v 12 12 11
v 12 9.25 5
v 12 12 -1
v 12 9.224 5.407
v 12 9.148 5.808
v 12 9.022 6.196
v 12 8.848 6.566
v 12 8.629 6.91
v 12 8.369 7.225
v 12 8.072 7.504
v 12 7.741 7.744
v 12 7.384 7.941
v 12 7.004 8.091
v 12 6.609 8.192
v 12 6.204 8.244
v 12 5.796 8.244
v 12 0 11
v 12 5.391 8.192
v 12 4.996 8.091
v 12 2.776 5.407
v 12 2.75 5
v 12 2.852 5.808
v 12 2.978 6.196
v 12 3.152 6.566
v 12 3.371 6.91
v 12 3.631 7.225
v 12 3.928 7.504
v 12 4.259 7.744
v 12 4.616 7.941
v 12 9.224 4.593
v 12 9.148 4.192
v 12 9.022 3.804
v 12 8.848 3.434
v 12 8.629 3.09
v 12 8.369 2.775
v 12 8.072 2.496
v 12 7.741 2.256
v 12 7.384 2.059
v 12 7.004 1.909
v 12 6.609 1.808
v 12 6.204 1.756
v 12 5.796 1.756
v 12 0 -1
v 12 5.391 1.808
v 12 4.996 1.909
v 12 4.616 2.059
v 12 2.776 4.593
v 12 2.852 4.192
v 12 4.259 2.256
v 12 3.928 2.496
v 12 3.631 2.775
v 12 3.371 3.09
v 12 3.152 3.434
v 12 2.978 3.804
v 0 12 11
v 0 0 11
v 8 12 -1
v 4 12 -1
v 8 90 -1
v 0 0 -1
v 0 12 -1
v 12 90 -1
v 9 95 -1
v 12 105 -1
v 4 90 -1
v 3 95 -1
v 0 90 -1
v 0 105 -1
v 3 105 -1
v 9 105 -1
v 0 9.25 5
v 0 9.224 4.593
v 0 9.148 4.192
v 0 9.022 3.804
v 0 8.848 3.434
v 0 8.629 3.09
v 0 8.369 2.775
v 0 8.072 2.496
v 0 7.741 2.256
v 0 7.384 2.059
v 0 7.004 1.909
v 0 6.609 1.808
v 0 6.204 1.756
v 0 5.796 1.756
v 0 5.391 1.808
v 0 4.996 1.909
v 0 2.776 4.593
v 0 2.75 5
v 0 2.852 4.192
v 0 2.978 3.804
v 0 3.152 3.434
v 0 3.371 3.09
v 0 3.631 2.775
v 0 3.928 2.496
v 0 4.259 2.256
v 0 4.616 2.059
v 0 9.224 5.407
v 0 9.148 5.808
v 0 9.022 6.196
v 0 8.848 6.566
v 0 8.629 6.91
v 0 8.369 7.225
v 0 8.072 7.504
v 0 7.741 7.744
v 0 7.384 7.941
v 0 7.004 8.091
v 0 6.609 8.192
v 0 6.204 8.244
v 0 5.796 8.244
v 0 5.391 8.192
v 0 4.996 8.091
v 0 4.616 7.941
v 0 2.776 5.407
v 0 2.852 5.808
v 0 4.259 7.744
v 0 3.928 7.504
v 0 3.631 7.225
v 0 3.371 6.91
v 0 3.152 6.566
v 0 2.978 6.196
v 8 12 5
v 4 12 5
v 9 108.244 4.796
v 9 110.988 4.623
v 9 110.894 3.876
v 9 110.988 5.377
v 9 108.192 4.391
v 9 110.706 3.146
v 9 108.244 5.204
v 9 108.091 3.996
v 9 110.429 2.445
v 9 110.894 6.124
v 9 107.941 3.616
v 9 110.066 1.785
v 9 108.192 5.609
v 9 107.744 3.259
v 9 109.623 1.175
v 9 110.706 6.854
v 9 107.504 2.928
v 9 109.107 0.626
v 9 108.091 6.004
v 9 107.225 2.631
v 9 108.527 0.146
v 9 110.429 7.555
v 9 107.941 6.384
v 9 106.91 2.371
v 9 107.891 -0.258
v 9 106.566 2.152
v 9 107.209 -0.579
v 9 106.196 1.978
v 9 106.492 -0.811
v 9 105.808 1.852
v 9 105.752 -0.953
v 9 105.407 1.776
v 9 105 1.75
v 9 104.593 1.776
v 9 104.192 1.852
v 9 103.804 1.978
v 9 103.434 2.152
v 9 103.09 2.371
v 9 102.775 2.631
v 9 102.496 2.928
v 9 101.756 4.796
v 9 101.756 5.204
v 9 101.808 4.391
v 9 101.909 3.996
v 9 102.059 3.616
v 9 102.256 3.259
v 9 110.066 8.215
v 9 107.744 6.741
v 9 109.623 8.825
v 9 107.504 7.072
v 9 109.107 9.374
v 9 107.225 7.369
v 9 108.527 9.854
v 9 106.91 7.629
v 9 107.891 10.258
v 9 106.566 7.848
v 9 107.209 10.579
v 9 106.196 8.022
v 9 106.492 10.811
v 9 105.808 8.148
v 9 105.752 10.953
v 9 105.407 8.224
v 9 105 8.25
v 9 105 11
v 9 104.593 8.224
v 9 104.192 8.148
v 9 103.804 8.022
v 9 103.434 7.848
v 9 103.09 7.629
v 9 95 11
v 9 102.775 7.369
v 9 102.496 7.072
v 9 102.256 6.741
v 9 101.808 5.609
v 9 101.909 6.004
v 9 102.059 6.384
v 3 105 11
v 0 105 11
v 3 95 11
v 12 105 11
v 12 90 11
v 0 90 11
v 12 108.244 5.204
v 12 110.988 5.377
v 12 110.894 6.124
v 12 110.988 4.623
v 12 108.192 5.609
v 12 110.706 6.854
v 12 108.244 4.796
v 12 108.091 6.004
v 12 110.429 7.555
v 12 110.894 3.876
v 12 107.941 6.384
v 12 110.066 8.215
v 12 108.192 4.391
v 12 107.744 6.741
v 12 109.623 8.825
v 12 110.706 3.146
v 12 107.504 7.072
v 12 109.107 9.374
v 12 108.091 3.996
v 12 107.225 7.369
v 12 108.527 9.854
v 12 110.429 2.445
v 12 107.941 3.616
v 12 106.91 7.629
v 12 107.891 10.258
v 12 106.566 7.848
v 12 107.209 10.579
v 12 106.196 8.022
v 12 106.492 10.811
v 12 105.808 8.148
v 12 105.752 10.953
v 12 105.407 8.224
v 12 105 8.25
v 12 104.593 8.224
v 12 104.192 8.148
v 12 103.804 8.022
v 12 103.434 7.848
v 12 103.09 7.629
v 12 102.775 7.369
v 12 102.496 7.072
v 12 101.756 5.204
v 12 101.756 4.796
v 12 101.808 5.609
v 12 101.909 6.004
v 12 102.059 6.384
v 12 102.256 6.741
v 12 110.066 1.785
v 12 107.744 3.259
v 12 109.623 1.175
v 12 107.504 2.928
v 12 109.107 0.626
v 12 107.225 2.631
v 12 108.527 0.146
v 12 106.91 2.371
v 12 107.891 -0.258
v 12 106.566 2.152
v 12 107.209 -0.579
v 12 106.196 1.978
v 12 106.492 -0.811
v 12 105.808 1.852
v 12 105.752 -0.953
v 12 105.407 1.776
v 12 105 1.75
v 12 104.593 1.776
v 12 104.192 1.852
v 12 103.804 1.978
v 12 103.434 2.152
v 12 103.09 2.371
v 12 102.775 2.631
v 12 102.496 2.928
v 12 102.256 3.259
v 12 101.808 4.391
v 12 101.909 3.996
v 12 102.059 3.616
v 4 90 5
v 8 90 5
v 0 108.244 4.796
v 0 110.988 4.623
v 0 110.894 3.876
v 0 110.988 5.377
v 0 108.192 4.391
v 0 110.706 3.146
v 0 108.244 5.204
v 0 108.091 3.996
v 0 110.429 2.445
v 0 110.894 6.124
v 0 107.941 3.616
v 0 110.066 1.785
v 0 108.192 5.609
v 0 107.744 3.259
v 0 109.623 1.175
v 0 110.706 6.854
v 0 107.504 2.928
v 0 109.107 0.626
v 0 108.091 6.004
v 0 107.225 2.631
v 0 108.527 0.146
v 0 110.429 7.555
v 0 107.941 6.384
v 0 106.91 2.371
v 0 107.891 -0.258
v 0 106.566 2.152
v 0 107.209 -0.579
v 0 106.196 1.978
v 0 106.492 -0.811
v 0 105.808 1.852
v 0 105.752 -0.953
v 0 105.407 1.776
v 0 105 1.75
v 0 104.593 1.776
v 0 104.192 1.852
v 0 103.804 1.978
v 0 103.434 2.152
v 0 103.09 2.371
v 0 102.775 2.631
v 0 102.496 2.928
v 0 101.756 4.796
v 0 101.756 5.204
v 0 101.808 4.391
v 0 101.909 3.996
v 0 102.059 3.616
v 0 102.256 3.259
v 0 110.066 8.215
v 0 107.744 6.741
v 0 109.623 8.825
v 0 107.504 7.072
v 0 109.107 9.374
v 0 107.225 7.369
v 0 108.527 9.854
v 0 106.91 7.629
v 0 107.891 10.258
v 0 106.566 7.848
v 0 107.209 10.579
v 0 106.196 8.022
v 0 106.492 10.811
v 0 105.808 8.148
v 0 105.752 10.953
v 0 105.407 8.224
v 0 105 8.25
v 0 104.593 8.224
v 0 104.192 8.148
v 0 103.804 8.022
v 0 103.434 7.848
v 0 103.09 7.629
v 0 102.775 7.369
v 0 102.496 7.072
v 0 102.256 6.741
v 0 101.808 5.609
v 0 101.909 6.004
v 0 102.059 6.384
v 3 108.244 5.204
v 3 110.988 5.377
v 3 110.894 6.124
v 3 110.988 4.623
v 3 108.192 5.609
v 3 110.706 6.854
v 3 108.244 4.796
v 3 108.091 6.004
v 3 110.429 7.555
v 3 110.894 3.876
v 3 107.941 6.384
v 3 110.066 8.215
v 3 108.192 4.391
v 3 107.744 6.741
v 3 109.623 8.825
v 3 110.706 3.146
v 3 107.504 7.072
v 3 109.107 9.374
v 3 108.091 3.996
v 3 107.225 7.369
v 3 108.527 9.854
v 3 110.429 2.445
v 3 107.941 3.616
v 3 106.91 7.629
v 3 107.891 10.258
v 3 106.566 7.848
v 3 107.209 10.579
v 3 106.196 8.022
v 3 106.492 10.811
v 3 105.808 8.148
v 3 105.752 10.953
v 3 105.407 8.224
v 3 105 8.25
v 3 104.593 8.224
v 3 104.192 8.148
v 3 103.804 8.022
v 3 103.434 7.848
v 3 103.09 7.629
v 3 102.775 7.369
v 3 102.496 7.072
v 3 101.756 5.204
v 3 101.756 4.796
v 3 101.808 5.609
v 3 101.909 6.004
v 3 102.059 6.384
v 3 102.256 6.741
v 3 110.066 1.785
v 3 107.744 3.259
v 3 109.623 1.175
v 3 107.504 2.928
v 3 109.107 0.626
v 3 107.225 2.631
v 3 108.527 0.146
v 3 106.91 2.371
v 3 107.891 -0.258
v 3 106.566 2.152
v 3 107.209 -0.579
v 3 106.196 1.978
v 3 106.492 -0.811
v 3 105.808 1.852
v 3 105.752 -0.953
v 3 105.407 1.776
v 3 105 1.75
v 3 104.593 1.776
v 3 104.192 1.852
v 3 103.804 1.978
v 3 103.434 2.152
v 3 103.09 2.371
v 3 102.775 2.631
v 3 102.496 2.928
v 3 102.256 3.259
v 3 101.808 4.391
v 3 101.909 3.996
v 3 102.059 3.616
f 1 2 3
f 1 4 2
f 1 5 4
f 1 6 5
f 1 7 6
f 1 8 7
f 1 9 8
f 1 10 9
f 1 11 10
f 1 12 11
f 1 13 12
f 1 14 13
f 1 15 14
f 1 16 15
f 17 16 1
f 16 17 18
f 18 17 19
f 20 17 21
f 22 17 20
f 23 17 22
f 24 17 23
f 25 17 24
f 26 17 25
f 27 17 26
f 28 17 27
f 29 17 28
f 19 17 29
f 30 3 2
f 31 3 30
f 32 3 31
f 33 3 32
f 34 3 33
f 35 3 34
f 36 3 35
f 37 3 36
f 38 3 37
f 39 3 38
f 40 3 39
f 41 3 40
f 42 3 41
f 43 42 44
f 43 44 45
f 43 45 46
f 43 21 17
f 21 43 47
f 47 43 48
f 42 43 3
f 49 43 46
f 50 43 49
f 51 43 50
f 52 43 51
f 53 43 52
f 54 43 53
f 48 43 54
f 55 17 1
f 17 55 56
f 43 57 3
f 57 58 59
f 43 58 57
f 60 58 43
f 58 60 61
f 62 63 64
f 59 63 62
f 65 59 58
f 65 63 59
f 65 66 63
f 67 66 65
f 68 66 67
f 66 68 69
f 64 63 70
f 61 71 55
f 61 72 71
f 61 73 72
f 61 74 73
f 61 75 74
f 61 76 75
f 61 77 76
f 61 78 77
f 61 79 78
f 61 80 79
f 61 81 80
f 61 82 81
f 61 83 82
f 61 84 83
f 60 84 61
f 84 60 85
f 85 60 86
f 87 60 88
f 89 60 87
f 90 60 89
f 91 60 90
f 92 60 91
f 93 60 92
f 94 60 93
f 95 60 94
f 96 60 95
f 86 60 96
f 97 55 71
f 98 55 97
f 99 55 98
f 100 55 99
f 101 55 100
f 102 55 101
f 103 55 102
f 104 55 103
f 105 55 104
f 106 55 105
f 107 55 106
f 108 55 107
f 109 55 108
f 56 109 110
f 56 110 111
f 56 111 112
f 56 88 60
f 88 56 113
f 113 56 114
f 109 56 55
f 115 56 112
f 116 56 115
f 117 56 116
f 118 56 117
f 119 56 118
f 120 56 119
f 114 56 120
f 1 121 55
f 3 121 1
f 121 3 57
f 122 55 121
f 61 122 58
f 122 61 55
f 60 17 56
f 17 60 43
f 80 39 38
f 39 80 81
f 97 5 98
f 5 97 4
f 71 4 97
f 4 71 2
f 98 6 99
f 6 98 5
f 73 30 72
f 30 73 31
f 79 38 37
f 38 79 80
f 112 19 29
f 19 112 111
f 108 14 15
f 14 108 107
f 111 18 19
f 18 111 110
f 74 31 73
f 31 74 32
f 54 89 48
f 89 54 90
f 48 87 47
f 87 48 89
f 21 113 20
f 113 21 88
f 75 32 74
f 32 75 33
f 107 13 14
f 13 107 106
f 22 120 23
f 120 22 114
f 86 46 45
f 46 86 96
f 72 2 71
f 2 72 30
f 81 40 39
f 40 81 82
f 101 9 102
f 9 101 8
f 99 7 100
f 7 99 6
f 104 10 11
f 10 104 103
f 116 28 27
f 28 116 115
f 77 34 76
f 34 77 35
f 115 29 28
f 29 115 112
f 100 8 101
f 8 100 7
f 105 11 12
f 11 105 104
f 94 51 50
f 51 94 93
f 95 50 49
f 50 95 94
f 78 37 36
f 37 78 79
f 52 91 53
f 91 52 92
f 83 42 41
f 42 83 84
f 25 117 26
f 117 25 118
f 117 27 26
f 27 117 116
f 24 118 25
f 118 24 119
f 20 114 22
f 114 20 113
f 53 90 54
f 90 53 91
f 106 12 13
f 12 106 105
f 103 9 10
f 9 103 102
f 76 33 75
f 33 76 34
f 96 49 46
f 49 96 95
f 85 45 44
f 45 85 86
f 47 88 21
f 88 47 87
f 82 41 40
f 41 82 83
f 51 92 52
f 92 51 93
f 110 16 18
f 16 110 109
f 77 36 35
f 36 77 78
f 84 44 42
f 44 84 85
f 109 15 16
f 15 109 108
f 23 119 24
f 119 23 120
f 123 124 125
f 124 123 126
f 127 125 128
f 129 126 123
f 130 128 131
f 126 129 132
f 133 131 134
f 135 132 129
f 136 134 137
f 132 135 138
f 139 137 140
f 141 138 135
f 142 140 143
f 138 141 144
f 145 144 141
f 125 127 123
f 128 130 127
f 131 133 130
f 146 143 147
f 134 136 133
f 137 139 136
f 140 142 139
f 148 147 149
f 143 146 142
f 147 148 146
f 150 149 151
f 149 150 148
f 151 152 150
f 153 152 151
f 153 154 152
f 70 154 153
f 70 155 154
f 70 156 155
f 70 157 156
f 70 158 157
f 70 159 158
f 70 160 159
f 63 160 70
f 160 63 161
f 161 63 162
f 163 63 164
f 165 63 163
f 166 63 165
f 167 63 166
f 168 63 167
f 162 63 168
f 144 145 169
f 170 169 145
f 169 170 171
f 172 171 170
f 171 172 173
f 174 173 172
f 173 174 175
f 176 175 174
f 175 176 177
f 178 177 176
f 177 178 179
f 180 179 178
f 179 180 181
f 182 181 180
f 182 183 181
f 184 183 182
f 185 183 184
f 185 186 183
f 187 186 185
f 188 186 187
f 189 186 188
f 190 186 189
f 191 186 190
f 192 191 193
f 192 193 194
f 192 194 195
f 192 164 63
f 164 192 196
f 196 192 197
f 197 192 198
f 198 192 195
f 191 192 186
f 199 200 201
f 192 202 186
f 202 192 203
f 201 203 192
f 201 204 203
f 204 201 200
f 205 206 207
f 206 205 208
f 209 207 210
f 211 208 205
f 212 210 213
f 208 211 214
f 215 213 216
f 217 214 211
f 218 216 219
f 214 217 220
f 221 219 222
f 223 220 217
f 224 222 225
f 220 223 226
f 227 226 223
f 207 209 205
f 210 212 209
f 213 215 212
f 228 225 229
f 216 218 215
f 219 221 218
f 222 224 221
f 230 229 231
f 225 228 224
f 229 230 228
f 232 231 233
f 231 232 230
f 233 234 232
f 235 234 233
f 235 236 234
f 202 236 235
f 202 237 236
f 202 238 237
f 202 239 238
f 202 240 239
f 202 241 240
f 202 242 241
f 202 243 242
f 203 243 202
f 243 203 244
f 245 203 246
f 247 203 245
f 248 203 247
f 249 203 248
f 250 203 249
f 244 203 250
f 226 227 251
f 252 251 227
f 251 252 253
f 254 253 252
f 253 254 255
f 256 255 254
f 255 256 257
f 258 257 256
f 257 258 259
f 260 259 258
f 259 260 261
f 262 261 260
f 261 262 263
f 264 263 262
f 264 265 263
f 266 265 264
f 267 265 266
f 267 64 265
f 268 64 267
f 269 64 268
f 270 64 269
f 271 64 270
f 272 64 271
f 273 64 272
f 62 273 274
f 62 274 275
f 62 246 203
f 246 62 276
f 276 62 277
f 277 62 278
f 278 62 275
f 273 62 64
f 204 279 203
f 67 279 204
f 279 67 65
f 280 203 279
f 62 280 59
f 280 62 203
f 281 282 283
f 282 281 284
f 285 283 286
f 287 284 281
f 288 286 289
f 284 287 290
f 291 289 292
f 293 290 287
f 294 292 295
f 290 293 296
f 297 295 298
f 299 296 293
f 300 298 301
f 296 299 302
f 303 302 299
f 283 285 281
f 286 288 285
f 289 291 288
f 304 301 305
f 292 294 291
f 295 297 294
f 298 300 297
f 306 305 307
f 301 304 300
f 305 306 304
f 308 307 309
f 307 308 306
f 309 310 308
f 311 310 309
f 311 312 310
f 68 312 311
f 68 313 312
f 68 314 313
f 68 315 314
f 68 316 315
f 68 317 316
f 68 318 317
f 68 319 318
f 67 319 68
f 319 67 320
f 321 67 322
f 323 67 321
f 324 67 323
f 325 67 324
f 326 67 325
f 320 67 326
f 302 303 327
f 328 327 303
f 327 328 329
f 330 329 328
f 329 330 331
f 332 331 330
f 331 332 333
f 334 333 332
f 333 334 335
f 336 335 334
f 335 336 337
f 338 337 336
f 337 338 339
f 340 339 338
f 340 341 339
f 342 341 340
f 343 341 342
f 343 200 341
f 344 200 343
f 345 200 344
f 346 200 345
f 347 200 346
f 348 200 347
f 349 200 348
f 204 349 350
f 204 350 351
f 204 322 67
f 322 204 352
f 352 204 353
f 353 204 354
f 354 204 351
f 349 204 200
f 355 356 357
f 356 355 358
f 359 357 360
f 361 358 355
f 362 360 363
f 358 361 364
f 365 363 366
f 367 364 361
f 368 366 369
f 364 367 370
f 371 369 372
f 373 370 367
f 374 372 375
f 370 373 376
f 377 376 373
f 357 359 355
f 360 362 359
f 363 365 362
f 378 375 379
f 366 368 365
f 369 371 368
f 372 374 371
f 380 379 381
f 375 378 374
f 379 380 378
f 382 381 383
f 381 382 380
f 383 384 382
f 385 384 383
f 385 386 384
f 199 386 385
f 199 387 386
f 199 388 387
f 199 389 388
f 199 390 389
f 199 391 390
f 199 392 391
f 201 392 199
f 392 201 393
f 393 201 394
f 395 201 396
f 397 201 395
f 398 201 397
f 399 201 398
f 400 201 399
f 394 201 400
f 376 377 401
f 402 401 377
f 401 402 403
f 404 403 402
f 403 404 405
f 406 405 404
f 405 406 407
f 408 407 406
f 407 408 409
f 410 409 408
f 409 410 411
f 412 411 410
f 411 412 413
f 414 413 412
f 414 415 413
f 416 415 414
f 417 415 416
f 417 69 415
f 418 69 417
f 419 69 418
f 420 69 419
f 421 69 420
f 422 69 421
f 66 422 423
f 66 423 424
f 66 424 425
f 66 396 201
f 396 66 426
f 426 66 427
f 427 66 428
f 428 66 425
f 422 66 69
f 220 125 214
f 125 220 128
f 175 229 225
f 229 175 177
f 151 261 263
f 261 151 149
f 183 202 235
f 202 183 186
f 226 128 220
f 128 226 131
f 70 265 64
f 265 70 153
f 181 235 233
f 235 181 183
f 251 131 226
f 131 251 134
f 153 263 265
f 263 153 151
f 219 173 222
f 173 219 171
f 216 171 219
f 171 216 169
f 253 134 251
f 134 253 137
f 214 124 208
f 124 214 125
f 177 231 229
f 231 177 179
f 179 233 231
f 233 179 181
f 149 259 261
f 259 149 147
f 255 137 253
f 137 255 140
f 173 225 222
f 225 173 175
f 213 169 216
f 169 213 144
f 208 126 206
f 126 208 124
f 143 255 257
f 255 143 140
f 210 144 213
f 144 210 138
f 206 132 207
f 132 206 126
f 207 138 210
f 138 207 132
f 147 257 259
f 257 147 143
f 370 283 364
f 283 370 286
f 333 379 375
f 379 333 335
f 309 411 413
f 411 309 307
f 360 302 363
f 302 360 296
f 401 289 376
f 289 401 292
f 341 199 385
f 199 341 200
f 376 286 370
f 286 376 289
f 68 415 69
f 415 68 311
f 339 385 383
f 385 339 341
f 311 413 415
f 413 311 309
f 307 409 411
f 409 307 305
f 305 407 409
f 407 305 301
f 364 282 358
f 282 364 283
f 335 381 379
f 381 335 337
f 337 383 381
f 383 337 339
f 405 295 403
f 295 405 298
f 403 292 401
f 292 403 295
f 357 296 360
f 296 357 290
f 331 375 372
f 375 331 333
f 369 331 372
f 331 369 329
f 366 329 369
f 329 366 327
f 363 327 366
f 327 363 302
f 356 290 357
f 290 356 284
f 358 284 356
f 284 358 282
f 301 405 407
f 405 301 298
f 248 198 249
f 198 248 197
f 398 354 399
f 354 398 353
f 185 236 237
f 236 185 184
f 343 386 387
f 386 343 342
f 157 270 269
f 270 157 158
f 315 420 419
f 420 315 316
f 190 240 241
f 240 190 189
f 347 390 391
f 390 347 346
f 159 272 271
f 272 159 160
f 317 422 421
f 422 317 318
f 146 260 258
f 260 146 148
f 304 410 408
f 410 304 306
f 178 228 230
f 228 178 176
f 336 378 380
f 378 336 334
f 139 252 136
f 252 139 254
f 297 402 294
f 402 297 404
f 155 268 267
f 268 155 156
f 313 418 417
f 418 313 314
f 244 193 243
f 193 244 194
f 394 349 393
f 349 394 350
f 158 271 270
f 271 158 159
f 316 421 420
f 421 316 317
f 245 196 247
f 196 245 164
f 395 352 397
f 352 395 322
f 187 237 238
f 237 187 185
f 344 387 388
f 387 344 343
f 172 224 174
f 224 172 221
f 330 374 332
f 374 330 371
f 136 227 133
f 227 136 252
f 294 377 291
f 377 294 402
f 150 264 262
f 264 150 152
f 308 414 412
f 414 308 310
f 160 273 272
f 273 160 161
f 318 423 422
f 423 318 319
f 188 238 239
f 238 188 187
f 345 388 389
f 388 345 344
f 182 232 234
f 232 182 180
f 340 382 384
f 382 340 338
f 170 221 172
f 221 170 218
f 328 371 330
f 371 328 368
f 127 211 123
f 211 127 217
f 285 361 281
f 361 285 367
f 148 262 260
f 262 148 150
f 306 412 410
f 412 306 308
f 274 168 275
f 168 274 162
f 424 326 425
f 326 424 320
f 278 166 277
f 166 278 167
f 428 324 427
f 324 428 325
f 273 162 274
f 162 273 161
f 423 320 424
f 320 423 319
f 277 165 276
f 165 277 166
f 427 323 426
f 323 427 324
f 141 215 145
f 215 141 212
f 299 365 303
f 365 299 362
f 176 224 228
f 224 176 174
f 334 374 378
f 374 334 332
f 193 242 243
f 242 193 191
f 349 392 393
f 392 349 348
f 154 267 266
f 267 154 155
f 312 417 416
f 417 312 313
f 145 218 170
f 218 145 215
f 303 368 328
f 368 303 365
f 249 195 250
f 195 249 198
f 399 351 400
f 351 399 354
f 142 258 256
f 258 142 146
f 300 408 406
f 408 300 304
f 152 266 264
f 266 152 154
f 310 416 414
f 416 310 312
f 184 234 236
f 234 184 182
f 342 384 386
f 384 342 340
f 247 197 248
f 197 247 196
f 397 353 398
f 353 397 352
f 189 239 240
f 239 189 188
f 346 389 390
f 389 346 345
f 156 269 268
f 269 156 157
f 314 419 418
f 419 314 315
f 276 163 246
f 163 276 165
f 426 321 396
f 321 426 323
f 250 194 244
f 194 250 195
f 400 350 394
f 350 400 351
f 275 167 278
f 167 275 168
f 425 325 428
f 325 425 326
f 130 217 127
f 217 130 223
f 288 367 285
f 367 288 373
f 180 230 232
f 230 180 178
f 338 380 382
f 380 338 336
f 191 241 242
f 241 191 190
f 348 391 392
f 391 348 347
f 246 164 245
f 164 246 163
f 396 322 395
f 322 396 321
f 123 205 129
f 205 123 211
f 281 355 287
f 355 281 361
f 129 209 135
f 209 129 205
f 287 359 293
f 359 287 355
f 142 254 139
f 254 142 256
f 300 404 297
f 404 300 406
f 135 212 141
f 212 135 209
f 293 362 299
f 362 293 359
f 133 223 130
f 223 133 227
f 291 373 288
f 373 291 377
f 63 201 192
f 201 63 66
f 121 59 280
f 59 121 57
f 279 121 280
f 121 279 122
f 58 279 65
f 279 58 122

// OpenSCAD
module forchetta()
{
difference()//forchetta
	{
	union()
		{
		translate([0,0,-1]) cube([3,15,12]);
		translate([9,0,-1]) cube([3,15,12]);
		translate([0,0,5]) rotate ([0,90,0]) cylinder(d=12,h=3);
		translate([9,0,5]) rotate ([0,90,0]) cylinder(d=12,h=3);
		}
	translate([-5,0,5]) rotate([0,90,0]) cylinder(d=6.5,h=20);
	}

	translate([0,10,-1]) cube([12,5,12]);
	
}

$fn=50;

difference() // base
	{
	translate([0,0,-1]) cube(12);
	translate([-1,6,5]) rotate([90,0,90]) cylinder(d=6.5,h=14);
	}

translate([4,12,-1]) cube ([4,78,6]); //corpo

translate([12,105,0]) rotate (180,0,0)  forchetta();
